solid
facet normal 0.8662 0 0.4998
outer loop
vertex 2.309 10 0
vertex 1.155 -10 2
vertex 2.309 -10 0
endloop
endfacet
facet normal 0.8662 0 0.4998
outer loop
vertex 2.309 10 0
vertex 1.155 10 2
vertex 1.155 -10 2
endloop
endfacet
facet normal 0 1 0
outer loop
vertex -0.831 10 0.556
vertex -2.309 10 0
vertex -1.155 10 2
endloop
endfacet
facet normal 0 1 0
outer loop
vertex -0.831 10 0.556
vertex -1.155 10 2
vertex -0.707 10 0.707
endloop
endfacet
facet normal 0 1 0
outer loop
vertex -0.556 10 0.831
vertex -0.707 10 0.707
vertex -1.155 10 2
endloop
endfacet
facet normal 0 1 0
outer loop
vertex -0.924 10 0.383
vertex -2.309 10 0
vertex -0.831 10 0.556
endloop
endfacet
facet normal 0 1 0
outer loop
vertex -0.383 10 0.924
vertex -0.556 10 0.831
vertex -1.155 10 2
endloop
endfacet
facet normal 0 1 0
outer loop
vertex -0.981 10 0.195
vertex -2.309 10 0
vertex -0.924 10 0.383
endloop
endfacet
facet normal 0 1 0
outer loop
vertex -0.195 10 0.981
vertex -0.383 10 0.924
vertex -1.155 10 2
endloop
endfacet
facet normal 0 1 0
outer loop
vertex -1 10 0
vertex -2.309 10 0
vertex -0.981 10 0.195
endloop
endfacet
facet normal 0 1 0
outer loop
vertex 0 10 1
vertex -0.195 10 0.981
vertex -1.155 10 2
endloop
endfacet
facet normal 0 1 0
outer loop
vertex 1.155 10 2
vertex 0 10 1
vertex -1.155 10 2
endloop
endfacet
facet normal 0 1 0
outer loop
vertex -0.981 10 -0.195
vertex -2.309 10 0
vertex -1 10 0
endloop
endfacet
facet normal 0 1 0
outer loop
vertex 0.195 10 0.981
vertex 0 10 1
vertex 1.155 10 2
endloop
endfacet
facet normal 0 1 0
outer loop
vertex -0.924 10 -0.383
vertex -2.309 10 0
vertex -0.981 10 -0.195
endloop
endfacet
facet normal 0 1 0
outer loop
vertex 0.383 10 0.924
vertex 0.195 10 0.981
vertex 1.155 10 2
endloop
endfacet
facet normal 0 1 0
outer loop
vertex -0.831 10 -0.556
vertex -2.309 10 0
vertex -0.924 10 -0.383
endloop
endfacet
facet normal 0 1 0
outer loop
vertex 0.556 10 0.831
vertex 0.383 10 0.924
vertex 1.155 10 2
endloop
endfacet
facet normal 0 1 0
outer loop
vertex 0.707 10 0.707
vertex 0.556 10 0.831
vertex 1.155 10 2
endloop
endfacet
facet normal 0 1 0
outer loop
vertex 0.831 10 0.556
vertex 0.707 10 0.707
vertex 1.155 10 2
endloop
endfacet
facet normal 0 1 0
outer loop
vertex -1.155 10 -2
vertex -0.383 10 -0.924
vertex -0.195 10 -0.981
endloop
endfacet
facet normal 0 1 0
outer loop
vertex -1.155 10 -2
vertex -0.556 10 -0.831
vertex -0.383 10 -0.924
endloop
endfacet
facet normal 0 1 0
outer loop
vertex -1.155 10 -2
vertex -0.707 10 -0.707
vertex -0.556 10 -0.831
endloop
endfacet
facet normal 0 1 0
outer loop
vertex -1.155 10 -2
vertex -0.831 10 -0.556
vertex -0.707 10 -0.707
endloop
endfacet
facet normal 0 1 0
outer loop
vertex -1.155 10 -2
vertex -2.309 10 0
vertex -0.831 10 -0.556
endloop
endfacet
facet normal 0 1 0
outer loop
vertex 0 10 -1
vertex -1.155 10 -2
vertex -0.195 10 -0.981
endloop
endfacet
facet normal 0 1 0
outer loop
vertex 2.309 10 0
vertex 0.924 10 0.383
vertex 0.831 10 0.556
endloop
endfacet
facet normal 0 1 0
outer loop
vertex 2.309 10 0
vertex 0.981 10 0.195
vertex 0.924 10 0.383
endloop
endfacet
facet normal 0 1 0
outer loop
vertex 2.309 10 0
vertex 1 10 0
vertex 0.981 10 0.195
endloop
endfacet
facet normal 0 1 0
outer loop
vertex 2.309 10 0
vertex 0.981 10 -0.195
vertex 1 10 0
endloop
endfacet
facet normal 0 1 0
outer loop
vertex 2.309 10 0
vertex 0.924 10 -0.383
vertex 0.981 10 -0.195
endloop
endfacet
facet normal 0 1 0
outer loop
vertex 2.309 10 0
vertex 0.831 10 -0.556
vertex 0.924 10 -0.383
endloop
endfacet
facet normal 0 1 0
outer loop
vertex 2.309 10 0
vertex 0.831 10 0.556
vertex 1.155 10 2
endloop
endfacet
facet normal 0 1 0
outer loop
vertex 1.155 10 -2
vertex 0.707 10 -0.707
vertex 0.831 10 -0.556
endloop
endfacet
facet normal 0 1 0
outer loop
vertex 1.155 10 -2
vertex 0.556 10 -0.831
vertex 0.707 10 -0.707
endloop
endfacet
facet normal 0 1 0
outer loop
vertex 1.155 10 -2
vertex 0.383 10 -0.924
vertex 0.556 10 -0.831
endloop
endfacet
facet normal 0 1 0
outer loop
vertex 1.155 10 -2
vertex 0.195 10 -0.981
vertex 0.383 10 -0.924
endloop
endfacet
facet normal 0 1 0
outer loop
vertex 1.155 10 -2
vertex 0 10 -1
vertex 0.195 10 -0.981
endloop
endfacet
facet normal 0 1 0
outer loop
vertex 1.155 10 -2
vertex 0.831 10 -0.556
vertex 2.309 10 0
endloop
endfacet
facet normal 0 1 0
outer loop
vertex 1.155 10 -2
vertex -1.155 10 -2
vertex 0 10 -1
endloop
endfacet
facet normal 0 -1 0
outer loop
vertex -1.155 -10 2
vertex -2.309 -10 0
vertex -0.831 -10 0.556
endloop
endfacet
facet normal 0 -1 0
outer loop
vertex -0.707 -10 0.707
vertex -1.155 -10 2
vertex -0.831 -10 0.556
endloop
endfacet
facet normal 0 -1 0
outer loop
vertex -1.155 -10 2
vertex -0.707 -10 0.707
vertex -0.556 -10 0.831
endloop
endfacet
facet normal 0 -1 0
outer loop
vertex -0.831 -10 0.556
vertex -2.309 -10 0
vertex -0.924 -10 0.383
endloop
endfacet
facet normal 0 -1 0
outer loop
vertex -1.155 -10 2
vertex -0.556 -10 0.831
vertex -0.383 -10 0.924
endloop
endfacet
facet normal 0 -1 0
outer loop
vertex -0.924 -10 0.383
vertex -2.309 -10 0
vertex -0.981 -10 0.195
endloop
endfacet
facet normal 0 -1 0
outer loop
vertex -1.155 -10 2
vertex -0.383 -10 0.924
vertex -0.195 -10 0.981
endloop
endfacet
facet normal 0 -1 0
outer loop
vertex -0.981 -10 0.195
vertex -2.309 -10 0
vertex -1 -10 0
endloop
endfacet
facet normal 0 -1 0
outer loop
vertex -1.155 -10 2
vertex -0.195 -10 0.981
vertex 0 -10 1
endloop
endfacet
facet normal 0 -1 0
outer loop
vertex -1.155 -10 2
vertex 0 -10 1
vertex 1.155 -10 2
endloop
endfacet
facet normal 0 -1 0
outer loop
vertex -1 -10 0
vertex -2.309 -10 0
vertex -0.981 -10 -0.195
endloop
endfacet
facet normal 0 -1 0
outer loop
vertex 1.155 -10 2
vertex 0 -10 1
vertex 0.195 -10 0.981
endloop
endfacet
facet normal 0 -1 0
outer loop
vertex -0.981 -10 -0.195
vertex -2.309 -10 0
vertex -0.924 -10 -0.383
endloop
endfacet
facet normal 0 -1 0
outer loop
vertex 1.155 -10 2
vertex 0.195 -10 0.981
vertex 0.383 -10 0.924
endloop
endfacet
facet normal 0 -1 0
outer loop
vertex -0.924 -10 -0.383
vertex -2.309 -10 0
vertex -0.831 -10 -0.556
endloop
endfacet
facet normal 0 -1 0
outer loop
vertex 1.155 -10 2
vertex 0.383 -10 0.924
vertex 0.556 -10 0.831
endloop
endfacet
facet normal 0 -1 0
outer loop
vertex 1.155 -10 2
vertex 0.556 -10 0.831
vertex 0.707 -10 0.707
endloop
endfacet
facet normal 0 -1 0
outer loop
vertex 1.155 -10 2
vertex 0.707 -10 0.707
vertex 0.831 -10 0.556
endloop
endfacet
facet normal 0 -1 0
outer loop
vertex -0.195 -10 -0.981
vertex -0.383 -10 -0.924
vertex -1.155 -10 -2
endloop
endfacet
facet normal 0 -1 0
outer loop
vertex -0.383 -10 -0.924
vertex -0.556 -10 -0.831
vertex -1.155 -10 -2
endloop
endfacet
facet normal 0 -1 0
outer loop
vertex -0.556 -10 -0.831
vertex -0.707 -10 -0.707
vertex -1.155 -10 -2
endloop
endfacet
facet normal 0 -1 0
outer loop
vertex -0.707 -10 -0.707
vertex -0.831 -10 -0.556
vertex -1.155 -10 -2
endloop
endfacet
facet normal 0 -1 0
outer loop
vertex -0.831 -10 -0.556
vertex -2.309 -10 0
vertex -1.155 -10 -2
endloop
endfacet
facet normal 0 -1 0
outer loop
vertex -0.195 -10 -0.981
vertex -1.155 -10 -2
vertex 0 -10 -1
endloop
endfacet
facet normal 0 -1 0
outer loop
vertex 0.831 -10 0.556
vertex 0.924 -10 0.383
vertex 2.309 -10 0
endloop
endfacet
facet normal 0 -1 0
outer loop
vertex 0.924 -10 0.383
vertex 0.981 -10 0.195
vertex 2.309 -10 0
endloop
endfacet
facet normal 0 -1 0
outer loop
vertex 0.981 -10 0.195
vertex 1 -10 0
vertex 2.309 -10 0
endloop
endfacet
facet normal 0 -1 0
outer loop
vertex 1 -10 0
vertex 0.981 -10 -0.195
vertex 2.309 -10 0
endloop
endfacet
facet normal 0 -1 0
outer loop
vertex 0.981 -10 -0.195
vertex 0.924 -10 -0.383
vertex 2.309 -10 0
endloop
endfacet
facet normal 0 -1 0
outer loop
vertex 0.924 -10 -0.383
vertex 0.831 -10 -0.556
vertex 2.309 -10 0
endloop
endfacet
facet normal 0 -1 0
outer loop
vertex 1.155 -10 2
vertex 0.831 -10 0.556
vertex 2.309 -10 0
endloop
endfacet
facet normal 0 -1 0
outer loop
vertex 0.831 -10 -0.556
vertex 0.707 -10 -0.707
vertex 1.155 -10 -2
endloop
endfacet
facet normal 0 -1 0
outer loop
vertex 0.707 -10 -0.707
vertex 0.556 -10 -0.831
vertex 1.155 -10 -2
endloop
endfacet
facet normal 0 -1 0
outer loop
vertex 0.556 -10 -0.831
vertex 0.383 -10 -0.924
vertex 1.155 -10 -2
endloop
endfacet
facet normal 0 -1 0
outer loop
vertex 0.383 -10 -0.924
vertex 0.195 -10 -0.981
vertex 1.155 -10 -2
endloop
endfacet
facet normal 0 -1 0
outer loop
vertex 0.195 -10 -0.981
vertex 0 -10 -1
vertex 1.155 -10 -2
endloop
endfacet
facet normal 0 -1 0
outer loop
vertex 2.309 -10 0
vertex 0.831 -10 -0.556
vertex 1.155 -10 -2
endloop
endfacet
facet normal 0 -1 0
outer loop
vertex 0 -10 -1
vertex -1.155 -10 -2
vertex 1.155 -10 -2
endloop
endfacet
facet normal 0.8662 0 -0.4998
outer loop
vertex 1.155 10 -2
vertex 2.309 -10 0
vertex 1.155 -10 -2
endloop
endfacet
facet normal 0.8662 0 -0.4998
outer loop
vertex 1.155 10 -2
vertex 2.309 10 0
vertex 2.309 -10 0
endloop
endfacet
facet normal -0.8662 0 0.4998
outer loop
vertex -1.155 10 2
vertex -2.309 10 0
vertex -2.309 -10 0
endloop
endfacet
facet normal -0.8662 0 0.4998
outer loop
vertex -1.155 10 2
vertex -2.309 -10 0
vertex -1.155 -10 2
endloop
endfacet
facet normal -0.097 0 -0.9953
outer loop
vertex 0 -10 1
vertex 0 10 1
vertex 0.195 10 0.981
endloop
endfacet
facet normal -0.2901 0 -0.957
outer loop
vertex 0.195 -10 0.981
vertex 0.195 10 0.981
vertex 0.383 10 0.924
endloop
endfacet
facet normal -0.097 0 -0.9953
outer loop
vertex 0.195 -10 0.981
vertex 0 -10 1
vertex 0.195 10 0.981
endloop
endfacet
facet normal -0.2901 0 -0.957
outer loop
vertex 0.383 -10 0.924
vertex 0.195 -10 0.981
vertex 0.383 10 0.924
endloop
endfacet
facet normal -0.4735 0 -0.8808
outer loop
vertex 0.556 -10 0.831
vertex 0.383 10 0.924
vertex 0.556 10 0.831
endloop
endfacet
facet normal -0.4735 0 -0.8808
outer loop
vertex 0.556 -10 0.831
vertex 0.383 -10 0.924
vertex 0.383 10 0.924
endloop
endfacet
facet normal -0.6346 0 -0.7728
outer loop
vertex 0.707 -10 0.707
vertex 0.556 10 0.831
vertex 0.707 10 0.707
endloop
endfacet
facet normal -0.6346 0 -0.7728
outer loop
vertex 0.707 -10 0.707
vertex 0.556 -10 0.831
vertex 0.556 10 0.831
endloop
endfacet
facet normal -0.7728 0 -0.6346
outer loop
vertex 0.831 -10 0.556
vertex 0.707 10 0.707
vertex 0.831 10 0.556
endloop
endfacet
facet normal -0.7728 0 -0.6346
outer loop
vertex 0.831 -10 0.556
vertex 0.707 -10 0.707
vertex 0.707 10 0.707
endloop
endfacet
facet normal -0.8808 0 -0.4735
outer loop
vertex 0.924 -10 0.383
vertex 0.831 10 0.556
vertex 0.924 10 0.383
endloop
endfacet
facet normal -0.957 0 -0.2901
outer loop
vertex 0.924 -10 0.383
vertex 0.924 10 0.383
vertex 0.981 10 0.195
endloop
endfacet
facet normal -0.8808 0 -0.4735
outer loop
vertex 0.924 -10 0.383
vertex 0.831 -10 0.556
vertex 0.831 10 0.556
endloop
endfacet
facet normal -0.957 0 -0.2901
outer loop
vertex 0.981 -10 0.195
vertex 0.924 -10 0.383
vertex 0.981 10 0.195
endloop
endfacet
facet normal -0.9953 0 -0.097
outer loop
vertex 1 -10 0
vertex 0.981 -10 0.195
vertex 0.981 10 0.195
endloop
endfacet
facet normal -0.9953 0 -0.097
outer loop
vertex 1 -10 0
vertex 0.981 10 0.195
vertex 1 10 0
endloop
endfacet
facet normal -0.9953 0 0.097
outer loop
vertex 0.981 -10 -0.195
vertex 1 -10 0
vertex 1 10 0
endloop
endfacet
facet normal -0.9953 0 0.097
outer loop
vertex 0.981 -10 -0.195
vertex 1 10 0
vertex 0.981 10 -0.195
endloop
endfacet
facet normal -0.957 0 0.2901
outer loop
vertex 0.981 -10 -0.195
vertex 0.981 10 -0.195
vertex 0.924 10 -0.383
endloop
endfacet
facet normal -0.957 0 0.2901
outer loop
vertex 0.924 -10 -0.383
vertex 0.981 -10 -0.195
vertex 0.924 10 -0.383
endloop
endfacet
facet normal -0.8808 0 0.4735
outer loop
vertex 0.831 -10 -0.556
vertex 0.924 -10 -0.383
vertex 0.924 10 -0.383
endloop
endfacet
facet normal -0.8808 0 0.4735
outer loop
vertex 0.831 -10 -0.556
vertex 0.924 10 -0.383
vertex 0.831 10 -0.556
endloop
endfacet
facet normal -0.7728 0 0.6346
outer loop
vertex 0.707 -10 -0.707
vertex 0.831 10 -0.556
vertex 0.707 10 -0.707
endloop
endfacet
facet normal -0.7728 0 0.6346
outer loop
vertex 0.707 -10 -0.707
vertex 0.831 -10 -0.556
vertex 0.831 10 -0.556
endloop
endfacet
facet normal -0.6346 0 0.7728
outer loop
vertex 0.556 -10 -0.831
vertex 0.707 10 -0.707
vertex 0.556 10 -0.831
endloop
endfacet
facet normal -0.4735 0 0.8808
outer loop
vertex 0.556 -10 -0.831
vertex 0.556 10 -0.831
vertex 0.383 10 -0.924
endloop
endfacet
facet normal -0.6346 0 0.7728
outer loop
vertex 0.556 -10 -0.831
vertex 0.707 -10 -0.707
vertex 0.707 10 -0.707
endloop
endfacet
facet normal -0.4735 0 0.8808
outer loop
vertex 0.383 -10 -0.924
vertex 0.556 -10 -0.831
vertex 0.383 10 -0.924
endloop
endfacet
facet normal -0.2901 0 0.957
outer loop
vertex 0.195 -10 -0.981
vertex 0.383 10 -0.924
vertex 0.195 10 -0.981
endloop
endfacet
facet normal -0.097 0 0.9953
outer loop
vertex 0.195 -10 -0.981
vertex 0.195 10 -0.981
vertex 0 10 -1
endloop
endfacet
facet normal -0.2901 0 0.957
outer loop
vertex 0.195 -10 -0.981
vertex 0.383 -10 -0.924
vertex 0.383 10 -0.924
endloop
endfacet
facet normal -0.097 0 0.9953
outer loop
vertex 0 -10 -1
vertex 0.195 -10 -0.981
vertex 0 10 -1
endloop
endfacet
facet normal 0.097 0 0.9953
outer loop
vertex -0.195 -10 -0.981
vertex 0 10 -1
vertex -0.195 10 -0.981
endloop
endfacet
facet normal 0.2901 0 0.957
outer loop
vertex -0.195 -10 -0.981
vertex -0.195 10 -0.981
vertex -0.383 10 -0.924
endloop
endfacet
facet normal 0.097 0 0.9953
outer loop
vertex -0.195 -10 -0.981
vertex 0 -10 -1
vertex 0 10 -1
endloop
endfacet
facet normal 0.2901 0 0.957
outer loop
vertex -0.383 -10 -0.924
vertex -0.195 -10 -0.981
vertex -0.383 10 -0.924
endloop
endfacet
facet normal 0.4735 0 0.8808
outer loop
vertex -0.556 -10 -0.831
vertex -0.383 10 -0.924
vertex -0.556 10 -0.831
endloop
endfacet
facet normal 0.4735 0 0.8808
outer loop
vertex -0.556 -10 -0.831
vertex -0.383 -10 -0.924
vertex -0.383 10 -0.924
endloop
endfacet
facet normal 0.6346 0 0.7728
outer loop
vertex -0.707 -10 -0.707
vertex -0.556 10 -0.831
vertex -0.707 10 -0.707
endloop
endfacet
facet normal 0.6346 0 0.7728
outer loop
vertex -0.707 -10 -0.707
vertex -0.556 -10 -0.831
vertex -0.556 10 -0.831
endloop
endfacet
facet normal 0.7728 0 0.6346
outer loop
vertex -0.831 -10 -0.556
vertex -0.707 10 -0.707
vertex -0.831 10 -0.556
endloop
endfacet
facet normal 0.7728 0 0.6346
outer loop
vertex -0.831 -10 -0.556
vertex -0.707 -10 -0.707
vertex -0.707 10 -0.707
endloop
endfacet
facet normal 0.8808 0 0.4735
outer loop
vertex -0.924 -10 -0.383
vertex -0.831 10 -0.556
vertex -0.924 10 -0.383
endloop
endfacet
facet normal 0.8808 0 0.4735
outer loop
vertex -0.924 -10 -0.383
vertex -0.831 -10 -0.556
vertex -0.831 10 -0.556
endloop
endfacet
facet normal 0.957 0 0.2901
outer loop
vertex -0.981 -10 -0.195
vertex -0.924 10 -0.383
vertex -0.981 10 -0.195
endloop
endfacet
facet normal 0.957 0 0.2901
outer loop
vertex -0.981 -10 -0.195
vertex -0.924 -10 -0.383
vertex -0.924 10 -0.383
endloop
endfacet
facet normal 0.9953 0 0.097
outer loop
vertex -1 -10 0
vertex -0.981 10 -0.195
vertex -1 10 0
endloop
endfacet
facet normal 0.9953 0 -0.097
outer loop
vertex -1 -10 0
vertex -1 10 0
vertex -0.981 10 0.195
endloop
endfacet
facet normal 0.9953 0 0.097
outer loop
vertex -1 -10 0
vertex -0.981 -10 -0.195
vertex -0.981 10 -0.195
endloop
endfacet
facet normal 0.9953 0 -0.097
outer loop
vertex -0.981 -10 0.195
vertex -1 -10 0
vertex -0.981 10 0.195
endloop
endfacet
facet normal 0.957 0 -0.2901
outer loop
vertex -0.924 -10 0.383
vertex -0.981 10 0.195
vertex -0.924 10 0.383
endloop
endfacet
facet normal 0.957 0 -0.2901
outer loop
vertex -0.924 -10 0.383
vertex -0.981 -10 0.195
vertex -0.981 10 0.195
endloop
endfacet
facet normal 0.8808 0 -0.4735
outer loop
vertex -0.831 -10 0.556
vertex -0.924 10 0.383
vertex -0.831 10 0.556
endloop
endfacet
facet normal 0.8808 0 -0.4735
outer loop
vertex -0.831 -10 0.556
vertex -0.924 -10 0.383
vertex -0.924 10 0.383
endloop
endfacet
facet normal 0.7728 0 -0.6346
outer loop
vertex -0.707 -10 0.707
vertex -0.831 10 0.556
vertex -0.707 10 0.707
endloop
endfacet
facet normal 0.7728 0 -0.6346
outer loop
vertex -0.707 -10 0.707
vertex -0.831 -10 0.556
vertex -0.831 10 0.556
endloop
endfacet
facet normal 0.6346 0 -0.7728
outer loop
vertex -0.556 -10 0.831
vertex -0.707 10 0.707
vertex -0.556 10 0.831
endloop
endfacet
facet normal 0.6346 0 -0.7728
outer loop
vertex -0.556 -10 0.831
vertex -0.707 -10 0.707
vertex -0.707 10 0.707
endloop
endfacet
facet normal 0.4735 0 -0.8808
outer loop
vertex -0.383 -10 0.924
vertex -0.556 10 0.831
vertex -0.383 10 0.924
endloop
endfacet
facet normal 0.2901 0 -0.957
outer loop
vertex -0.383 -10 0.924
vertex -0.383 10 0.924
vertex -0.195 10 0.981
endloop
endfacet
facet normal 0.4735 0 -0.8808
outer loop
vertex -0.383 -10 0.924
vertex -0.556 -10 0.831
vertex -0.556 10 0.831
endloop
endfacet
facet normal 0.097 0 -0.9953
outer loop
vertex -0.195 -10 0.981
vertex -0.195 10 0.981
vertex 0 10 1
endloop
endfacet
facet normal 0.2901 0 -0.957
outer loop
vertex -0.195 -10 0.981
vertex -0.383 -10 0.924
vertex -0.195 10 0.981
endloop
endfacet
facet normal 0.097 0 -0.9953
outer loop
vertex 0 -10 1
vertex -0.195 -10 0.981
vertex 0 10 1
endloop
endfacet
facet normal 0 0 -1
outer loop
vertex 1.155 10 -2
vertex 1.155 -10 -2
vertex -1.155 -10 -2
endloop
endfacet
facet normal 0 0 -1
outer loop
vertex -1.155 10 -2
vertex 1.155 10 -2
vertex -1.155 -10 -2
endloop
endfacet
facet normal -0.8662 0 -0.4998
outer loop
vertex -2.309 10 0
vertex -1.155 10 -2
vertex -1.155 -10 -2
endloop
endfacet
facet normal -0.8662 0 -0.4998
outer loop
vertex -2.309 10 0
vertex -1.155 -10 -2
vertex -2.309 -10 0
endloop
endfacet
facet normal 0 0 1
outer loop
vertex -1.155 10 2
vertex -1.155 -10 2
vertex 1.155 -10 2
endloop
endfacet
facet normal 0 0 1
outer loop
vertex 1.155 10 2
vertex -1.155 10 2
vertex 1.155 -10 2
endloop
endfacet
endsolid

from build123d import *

# Parameters (mm, degrees)
SKETCH_1_R      = 1
EXTRUDE_1_DEPTH = 10


with BuildPart() as part:
    # 草图1 → 凸台-拉伸1 (new, symmetric)
    with BuildSketch(Plane(origin=(0, 0, 0), x_dir=(1, 0, 0), z_dir=(0, 1, 0))):
        Polygon((2.309401077, 0), (1.154700538, 2), (-1.154700538, 2), (-2.309401077, 0), (-1.154700538, -2), (1.154700538, -2), align=None)
        with Locations(Location((0, 0, 0), (0, 0, 270))):
            Circle(SKETCH_1_R, mode=Mode.SUBTRACT)
    extrude(amount=EXTRUDE_1_DEPTH, both=True)


solid = part.part
